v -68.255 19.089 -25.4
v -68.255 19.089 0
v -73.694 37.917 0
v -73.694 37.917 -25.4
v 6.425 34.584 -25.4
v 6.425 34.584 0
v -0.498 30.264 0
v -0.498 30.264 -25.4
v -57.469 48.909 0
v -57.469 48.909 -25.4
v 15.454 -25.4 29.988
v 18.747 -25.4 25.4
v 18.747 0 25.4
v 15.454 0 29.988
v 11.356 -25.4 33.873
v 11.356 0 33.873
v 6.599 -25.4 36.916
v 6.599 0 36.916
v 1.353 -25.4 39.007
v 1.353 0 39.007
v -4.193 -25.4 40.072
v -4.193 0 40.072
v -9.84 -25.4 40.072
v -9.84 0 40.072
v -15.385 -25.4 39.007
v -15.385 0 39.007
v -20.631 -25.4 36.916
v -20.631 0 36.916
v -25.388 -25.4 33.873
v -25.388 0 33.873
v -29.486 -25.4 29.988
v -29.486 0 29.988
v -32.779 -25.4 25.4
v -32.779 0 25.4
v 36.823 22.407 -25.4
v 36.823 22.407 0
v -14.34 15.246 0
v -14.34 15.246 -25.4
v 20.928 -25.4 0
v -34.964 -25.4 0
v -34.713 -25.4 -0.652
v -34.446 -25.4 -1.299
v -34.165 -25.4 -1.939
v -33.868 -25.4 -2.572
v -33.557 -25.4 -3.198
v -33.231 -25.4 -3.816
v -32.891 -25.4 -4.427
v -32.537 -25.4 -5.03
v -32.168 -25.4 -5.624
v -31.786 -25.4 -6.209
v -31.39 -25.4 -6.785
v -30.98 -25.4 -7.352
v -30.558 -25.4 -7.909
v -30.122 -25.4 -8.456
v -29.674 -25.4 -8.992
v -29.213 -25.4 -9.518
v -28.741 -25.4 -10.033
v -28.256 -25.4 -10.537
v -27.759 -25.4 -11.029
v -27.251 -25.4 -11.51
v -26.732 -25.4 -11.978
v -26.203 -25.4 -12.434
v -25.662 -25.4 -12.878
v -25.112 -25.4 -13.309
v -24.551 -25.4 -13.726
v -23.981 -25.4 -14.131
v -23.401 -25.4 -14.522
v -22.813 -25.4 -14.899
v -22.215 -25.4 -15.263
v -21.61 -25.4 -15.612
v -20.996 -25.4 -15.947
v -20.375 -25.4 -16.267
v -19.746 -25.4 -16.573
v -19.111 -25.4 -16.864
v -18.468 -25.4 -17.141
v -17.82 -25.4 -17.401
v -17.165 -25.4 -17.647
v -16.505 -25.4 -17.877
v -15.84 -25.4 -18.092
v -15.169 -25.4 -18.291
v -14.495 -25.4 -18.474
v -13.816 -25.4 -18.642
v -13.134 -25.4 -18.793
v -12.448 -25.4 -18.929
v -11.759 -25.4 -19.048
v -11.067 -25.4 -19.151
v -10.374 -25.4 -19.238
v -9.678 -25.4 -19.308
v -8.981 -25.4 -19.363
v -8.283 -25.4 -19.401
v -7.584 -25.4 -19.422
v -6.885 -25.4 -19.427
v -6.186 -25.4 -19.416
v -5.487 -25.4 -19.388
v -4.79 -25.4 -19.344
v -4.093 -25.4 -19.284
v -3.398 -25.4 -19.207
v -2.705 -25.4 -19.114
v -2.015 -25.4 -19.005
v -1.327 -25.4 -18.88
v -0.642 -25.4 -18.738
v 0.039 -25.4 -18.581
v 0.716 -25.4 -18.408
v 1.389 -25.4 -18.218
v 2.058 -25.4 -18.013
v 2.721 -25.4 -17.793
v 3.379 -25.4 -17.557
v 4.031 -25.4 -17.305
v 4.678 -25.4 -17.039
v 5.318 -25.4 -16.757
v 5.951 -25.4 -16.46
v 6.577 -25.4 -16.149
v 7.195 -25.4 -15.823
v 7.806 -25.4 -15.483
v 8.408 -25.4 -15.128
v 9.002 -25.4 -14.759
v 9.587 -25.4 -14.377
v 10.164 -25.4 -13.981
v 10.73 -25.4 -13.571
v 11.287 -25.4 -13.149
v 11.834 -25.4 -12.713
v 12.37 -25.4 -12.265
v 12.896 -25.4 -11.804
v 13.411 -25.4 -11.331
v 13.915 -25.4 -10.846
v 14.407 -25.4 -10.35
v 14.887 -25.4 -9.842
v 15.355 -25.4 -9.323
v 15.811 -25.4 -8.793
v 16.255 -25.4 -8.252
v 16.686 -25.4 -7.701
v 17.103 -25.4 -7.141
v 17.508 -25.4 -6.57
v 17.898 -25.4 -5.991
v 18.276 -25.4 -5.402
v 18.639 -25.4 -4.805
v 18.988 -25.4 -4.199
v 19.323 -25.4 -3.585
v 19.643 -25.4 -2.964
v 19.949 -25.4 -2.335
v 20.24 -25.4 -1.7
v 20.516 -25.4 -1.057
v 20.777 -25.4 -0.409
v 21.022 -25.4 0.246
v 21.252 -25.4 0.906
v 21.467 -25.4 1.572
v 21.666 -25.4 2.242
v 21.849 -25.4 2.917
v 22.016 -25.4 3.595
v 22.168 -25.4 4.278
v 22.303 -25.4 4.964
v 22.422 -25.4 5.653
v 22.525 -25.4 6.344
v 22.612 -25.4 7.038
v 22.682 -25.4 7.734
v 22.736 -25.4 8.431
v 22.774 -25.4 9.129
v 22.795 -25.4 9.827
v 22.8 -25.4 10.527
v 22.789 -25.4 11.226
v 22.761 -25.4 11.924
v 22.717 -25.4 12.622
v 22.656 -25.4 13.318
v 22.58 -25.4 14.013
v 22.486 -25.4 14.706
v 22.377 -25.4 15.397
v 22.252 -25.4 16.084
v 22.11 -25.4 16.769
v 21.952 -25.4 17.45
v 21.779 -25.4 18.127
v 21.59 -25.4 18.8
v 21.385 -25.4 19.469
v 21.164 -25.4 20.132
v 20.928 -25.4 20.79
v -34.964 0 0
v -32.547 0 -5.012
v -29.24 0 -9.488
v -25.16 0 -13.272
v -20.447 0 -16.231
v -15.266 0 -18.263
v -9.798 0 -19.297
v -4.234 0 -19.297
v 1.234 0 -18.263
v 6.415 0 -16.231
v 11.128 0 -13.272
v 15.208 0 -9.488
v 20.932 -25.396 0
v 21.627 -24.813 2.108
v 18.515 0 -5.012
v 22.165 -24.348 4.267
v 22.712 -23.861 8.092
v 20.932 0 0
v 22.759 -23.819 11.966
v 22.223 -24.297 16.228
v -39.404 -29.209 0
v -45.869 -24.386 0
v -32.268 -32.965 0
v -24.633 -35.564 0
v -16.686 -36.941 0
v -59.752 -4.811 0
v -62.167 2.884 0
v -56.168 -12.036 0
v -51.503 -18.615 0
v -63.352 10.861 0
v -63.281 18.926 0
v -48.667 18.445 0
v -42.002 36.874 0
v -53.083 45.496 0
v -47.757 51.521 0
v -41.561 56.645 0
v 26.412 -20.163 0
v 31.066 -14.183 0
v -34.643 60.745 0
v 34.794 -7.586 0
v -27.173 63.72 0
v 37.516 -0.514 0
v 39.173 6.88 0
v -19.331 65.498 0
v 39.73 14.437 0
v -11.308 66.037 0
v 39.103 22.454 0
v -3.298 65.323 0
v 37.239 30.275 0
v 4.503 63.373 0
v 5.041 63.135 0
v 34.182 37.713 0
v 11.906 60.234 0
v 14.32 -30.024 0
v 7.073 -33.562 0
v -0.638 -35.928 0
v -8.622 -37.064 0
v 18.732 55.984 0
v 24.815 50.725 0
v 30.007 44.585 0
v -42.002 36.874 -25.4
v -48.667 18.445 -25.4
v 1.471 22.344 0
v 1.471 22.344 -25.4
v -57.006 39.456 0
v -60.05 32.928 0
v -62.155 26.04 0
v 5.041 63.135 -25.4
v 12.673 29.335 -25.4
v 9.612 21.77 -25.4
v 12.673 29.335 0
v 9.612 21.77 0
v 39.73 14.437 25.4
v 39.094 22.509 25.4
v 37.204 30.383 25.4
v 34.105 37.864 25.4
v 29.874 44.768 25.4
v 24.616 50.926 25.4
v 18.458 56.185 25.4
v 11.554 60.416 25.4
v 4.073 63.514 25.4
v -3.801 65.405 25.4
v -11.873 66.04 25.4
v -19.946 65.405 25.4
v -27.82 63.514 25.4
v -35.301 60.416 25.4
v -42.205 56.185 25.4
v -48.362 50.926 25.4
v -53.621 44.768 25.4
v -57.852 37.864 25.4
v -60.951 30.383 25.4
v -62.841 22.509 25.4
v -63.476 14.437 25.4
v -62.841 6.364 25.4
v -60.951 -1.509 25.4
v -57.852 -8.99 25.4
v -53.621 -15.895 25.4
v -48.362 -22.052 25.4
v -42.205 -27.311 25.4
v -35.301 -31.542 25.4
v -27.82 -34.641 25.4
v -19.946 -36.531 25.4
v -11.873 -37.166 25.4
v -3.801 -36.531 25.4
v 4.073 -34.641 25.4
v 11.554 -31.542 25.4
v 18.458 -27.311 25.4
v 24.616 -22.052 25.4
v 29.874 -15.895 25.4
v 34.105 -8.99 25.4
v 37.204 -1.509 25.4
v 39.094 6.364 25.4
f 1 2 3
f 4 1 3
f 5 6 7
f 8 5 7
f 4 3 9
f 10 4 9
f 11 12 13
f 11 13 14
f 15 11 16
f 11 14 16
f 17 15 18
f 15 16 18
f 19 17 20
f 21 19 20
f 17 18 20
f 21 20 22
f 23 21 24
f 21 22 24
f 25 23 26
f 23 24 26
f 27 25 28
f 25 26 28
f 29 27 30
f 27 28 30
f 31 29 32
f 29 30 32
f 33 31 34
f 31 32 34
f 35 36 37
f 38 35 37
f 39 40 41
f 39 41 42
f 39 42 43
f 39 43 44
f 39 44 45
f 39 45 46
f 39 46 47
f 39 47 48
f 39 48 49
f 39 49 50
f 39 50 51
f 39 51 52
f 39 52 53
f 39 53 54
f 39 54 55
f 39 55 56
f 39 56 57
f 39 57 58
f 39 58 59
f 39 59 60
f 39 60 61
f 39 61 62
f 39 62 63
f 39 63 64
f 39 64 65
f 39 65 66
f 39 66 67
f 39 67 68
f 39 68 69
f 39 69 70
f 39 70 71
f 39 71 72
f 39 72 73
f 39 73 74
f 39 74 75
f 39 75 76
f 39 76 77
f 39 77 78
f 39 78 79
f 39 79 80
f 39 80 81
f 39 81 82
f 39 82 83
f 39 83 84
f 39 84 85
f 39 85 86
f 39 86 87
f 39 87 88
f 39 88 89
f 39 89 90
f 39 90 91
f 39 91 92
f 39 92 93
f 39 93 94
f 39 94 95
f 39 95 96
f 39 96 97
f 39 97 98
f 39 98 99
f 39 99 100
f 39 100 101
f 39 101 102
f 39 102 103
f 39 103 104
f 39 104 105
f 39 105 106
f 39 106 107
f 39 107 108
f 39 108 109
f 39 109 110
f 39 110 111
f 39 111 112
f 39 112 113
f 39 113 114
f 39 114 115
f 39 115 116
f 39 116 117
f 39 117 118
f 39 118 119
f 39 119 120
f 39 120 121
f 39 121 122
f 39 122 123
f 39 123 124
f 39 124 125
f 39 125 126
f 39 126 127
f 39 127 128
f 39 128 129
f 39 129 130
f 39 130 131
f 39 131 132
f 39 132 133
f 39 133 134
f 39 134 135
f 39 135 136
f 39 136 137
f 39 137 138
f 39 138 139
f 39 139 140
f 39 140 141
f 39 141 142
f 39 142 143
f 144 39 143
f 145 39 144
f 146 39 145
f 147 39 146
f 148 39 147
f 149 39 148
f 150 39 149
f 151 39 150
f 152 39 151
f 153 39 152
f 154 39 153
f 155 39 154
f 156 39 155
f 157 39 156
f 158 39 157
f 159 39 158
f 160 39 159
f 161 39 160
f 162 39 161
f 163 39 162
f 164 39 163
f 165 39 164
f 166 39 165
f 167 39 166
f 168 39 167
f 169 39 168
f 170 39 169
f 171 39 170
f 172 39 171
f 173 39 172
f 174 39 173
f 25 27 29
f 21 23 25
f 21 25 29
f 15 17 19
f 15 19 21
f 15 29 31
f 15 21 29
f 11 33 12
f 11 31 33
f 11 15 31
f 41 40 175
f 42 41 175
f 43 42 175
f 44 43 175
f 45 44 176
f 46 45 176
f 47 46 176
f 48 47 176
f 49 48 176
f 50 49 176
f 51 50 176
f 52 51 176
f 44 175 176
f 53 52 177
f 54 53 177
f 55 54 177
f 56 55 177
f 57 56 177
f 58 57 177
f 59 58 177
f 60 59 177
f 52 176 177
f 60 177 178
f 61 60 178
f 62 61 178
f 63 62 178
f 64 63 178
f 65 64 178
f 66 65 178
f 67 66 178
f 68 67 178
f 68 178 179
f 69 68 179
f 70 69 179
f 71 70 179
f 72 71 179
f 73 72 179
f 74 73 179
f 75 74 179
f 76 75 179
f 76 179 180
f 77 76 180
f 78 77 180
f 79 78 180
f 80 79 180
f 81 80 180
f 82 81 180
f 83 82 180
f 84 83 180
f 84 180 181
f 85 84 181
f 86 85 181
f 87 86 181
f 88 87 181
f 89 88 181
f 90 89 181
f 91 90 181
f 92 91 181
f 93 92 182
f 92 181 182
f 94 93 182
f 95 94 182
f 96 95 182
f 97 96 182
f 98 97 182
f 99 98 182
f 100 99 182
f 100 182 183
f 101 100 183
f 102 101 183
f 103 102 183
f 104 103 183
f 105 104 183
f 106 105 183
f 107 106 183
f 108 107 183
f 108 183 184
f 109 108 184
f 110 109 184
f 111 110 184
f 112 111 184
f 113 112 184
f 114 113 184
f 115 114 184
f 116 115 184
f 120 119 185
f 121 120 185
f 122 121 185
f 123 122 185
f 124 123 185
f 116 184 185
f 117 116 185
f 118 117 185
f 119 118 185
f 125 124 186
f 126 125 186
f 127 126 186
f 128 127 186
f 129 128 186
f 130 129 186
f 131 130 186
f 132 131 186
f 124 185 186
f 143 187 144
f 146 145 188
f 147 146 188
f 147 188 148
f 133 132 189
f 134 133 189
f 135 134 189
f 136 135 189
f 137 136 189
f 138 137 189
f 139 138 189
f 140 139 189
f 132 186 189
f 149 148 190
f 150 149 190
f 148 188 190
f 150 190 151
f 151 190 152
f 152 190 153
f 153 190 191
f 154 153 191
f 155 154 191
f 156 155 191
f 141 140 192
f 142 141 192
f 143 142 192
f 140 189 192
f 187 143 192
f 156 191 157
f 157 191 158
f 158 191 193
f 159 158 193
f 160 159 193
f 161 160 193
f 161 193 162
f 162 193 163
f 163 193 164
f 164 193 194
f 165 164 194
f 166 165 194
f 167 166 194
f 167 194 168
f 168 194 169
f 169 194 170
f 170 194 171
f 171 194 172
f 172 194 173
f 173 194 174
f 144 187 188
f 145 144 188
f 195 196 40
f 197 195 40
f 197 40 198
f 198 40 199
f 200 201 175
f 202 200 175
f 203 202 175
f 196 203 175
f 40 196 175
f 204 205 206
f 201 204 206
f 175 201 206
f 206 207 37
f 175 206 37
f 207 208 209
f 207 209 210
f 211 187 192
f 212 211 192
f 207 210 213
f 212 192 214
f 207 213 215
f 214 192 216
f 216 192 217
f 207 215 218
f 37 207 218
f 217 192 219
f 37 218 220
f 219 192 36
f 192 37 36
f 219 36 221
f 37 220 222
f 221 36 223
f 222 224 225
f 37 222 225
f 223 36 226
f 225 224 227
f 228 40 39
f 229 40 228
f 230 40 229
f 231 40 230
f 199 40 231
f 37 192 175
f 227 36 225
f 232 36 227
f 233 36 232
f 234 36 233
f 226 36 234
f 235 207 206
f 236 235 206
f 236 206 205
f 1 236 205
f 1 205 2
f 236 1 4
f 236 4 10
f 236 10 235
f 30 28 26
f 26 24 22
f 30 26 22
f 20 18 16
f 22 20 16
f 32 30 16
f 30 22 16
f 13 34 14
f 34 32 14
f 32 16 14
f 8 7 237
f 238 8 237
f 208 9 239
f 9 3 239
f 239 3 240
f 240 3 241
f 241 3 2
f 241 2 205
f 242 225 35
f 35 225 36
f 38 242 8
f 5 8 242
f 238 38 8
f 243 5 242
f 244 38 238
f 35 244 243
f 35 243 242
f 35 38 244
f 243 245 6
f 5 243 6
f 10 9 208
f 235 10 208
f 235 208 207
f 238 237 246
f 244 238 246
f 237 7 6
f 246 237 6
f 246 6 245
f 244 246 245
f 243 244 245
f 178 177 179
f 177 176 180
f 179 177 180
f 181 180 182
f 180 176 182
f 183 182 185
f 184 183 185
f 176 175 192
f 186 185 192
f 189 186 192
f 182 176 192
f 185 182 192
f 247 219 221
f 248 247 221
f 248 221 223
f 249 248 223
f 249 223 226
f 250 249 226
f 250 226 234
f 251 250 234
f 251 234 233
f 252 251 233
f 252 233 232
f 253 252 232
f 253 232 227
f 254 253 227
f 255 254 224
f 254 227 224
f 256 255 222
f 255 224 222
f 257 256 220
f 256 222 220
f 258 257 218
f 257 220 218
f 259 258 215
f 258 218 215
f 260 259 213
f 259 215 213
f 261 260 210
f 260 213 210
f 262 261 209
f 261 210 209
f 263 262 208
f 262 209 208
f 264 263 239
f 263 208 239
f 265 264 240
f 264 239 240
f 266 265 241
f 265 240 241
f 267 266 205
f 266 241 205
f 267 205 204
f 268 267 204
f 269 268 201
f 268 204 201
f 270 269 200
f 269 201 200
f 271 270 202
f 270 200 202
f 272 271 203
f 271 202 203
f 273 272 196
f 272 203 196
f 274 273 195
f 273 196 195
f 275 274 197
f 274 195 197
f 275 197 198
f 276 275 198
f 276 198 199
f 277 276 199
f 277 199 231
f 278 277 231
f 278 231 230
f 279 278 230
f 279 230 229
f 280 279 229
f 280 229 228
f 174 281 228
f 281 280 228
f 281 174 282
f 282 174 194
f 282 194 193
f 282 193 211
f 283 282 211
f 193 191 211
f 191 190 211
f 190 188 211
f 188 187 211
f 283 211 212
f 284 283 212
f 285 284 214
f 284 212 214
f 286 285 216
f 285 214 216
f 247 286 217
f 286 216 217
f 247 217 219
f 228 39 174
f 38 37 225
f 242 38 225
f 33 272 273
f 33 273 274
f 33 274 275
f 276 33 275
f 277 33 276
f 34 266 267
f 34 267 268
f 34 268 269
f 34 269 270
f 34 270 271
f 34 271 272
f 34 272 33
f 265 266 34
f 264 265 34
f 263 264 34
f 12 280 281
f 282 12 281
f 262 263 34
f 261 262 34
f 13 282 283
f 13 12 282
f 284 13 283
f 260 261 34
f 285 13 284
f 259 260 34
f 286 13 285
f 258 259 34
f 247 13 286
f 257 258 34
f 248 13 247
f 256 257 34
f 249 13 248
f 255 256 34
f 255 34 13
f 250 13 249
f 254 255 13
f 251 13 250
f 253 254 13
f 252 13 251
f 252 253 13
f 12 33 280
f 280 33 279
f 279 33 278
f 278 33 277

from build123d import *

# Parameters (mm, degrees)
F0_R     = 51.603139
F1_DEPTH = 25.4
F2_R     = 29.816703
F3_DEPTH = 25.4
F5_DEPTH = 25.4


with BuildPart() as f1:
    # F0 (on Top) → F1 (new body)
    with BuildSketch(Plane.XY):
        with Locations((-11.873323, 14.43688)):
            Circle(F0_R)
    extrude(amount=F1_DEPTH)

    # F2 (on Front) → F3 (join)
    with BuildSketch(Plane.XZ):
        with Locations((-7.016055, 10.389157)):
            Circle(F2_R)
    extrude(amount=F3_DEPTH)

    # F4 (on face) → F5 (join)
    with BuildSketch(Plane(origin=(0, 0, 0), x_dir=(1, 0, 0), z_dir=(0, 0, -1))):
        Polygon((-42.001548, -36.874084), (-48.667458, -18.444801), (-68.254628, -19.089496), (-73.694254, -37.917224), (-57.468958, -48.908703), align=None)
        Polygon((5.040846, -63.135175), (36.823419, -22.406714), (-14.339749, -15.246429), align=None)
        Polygon((1.471444, -22.344262), (9.61187, -21.770288), (12.673282, -29.334925), (6.424912, -34.584102), (-0.498204, -30.263635), align=None, mode=Mode.SUBTRACT)
    extrude(amount=F5_DEPTH)


solid = f1.part
